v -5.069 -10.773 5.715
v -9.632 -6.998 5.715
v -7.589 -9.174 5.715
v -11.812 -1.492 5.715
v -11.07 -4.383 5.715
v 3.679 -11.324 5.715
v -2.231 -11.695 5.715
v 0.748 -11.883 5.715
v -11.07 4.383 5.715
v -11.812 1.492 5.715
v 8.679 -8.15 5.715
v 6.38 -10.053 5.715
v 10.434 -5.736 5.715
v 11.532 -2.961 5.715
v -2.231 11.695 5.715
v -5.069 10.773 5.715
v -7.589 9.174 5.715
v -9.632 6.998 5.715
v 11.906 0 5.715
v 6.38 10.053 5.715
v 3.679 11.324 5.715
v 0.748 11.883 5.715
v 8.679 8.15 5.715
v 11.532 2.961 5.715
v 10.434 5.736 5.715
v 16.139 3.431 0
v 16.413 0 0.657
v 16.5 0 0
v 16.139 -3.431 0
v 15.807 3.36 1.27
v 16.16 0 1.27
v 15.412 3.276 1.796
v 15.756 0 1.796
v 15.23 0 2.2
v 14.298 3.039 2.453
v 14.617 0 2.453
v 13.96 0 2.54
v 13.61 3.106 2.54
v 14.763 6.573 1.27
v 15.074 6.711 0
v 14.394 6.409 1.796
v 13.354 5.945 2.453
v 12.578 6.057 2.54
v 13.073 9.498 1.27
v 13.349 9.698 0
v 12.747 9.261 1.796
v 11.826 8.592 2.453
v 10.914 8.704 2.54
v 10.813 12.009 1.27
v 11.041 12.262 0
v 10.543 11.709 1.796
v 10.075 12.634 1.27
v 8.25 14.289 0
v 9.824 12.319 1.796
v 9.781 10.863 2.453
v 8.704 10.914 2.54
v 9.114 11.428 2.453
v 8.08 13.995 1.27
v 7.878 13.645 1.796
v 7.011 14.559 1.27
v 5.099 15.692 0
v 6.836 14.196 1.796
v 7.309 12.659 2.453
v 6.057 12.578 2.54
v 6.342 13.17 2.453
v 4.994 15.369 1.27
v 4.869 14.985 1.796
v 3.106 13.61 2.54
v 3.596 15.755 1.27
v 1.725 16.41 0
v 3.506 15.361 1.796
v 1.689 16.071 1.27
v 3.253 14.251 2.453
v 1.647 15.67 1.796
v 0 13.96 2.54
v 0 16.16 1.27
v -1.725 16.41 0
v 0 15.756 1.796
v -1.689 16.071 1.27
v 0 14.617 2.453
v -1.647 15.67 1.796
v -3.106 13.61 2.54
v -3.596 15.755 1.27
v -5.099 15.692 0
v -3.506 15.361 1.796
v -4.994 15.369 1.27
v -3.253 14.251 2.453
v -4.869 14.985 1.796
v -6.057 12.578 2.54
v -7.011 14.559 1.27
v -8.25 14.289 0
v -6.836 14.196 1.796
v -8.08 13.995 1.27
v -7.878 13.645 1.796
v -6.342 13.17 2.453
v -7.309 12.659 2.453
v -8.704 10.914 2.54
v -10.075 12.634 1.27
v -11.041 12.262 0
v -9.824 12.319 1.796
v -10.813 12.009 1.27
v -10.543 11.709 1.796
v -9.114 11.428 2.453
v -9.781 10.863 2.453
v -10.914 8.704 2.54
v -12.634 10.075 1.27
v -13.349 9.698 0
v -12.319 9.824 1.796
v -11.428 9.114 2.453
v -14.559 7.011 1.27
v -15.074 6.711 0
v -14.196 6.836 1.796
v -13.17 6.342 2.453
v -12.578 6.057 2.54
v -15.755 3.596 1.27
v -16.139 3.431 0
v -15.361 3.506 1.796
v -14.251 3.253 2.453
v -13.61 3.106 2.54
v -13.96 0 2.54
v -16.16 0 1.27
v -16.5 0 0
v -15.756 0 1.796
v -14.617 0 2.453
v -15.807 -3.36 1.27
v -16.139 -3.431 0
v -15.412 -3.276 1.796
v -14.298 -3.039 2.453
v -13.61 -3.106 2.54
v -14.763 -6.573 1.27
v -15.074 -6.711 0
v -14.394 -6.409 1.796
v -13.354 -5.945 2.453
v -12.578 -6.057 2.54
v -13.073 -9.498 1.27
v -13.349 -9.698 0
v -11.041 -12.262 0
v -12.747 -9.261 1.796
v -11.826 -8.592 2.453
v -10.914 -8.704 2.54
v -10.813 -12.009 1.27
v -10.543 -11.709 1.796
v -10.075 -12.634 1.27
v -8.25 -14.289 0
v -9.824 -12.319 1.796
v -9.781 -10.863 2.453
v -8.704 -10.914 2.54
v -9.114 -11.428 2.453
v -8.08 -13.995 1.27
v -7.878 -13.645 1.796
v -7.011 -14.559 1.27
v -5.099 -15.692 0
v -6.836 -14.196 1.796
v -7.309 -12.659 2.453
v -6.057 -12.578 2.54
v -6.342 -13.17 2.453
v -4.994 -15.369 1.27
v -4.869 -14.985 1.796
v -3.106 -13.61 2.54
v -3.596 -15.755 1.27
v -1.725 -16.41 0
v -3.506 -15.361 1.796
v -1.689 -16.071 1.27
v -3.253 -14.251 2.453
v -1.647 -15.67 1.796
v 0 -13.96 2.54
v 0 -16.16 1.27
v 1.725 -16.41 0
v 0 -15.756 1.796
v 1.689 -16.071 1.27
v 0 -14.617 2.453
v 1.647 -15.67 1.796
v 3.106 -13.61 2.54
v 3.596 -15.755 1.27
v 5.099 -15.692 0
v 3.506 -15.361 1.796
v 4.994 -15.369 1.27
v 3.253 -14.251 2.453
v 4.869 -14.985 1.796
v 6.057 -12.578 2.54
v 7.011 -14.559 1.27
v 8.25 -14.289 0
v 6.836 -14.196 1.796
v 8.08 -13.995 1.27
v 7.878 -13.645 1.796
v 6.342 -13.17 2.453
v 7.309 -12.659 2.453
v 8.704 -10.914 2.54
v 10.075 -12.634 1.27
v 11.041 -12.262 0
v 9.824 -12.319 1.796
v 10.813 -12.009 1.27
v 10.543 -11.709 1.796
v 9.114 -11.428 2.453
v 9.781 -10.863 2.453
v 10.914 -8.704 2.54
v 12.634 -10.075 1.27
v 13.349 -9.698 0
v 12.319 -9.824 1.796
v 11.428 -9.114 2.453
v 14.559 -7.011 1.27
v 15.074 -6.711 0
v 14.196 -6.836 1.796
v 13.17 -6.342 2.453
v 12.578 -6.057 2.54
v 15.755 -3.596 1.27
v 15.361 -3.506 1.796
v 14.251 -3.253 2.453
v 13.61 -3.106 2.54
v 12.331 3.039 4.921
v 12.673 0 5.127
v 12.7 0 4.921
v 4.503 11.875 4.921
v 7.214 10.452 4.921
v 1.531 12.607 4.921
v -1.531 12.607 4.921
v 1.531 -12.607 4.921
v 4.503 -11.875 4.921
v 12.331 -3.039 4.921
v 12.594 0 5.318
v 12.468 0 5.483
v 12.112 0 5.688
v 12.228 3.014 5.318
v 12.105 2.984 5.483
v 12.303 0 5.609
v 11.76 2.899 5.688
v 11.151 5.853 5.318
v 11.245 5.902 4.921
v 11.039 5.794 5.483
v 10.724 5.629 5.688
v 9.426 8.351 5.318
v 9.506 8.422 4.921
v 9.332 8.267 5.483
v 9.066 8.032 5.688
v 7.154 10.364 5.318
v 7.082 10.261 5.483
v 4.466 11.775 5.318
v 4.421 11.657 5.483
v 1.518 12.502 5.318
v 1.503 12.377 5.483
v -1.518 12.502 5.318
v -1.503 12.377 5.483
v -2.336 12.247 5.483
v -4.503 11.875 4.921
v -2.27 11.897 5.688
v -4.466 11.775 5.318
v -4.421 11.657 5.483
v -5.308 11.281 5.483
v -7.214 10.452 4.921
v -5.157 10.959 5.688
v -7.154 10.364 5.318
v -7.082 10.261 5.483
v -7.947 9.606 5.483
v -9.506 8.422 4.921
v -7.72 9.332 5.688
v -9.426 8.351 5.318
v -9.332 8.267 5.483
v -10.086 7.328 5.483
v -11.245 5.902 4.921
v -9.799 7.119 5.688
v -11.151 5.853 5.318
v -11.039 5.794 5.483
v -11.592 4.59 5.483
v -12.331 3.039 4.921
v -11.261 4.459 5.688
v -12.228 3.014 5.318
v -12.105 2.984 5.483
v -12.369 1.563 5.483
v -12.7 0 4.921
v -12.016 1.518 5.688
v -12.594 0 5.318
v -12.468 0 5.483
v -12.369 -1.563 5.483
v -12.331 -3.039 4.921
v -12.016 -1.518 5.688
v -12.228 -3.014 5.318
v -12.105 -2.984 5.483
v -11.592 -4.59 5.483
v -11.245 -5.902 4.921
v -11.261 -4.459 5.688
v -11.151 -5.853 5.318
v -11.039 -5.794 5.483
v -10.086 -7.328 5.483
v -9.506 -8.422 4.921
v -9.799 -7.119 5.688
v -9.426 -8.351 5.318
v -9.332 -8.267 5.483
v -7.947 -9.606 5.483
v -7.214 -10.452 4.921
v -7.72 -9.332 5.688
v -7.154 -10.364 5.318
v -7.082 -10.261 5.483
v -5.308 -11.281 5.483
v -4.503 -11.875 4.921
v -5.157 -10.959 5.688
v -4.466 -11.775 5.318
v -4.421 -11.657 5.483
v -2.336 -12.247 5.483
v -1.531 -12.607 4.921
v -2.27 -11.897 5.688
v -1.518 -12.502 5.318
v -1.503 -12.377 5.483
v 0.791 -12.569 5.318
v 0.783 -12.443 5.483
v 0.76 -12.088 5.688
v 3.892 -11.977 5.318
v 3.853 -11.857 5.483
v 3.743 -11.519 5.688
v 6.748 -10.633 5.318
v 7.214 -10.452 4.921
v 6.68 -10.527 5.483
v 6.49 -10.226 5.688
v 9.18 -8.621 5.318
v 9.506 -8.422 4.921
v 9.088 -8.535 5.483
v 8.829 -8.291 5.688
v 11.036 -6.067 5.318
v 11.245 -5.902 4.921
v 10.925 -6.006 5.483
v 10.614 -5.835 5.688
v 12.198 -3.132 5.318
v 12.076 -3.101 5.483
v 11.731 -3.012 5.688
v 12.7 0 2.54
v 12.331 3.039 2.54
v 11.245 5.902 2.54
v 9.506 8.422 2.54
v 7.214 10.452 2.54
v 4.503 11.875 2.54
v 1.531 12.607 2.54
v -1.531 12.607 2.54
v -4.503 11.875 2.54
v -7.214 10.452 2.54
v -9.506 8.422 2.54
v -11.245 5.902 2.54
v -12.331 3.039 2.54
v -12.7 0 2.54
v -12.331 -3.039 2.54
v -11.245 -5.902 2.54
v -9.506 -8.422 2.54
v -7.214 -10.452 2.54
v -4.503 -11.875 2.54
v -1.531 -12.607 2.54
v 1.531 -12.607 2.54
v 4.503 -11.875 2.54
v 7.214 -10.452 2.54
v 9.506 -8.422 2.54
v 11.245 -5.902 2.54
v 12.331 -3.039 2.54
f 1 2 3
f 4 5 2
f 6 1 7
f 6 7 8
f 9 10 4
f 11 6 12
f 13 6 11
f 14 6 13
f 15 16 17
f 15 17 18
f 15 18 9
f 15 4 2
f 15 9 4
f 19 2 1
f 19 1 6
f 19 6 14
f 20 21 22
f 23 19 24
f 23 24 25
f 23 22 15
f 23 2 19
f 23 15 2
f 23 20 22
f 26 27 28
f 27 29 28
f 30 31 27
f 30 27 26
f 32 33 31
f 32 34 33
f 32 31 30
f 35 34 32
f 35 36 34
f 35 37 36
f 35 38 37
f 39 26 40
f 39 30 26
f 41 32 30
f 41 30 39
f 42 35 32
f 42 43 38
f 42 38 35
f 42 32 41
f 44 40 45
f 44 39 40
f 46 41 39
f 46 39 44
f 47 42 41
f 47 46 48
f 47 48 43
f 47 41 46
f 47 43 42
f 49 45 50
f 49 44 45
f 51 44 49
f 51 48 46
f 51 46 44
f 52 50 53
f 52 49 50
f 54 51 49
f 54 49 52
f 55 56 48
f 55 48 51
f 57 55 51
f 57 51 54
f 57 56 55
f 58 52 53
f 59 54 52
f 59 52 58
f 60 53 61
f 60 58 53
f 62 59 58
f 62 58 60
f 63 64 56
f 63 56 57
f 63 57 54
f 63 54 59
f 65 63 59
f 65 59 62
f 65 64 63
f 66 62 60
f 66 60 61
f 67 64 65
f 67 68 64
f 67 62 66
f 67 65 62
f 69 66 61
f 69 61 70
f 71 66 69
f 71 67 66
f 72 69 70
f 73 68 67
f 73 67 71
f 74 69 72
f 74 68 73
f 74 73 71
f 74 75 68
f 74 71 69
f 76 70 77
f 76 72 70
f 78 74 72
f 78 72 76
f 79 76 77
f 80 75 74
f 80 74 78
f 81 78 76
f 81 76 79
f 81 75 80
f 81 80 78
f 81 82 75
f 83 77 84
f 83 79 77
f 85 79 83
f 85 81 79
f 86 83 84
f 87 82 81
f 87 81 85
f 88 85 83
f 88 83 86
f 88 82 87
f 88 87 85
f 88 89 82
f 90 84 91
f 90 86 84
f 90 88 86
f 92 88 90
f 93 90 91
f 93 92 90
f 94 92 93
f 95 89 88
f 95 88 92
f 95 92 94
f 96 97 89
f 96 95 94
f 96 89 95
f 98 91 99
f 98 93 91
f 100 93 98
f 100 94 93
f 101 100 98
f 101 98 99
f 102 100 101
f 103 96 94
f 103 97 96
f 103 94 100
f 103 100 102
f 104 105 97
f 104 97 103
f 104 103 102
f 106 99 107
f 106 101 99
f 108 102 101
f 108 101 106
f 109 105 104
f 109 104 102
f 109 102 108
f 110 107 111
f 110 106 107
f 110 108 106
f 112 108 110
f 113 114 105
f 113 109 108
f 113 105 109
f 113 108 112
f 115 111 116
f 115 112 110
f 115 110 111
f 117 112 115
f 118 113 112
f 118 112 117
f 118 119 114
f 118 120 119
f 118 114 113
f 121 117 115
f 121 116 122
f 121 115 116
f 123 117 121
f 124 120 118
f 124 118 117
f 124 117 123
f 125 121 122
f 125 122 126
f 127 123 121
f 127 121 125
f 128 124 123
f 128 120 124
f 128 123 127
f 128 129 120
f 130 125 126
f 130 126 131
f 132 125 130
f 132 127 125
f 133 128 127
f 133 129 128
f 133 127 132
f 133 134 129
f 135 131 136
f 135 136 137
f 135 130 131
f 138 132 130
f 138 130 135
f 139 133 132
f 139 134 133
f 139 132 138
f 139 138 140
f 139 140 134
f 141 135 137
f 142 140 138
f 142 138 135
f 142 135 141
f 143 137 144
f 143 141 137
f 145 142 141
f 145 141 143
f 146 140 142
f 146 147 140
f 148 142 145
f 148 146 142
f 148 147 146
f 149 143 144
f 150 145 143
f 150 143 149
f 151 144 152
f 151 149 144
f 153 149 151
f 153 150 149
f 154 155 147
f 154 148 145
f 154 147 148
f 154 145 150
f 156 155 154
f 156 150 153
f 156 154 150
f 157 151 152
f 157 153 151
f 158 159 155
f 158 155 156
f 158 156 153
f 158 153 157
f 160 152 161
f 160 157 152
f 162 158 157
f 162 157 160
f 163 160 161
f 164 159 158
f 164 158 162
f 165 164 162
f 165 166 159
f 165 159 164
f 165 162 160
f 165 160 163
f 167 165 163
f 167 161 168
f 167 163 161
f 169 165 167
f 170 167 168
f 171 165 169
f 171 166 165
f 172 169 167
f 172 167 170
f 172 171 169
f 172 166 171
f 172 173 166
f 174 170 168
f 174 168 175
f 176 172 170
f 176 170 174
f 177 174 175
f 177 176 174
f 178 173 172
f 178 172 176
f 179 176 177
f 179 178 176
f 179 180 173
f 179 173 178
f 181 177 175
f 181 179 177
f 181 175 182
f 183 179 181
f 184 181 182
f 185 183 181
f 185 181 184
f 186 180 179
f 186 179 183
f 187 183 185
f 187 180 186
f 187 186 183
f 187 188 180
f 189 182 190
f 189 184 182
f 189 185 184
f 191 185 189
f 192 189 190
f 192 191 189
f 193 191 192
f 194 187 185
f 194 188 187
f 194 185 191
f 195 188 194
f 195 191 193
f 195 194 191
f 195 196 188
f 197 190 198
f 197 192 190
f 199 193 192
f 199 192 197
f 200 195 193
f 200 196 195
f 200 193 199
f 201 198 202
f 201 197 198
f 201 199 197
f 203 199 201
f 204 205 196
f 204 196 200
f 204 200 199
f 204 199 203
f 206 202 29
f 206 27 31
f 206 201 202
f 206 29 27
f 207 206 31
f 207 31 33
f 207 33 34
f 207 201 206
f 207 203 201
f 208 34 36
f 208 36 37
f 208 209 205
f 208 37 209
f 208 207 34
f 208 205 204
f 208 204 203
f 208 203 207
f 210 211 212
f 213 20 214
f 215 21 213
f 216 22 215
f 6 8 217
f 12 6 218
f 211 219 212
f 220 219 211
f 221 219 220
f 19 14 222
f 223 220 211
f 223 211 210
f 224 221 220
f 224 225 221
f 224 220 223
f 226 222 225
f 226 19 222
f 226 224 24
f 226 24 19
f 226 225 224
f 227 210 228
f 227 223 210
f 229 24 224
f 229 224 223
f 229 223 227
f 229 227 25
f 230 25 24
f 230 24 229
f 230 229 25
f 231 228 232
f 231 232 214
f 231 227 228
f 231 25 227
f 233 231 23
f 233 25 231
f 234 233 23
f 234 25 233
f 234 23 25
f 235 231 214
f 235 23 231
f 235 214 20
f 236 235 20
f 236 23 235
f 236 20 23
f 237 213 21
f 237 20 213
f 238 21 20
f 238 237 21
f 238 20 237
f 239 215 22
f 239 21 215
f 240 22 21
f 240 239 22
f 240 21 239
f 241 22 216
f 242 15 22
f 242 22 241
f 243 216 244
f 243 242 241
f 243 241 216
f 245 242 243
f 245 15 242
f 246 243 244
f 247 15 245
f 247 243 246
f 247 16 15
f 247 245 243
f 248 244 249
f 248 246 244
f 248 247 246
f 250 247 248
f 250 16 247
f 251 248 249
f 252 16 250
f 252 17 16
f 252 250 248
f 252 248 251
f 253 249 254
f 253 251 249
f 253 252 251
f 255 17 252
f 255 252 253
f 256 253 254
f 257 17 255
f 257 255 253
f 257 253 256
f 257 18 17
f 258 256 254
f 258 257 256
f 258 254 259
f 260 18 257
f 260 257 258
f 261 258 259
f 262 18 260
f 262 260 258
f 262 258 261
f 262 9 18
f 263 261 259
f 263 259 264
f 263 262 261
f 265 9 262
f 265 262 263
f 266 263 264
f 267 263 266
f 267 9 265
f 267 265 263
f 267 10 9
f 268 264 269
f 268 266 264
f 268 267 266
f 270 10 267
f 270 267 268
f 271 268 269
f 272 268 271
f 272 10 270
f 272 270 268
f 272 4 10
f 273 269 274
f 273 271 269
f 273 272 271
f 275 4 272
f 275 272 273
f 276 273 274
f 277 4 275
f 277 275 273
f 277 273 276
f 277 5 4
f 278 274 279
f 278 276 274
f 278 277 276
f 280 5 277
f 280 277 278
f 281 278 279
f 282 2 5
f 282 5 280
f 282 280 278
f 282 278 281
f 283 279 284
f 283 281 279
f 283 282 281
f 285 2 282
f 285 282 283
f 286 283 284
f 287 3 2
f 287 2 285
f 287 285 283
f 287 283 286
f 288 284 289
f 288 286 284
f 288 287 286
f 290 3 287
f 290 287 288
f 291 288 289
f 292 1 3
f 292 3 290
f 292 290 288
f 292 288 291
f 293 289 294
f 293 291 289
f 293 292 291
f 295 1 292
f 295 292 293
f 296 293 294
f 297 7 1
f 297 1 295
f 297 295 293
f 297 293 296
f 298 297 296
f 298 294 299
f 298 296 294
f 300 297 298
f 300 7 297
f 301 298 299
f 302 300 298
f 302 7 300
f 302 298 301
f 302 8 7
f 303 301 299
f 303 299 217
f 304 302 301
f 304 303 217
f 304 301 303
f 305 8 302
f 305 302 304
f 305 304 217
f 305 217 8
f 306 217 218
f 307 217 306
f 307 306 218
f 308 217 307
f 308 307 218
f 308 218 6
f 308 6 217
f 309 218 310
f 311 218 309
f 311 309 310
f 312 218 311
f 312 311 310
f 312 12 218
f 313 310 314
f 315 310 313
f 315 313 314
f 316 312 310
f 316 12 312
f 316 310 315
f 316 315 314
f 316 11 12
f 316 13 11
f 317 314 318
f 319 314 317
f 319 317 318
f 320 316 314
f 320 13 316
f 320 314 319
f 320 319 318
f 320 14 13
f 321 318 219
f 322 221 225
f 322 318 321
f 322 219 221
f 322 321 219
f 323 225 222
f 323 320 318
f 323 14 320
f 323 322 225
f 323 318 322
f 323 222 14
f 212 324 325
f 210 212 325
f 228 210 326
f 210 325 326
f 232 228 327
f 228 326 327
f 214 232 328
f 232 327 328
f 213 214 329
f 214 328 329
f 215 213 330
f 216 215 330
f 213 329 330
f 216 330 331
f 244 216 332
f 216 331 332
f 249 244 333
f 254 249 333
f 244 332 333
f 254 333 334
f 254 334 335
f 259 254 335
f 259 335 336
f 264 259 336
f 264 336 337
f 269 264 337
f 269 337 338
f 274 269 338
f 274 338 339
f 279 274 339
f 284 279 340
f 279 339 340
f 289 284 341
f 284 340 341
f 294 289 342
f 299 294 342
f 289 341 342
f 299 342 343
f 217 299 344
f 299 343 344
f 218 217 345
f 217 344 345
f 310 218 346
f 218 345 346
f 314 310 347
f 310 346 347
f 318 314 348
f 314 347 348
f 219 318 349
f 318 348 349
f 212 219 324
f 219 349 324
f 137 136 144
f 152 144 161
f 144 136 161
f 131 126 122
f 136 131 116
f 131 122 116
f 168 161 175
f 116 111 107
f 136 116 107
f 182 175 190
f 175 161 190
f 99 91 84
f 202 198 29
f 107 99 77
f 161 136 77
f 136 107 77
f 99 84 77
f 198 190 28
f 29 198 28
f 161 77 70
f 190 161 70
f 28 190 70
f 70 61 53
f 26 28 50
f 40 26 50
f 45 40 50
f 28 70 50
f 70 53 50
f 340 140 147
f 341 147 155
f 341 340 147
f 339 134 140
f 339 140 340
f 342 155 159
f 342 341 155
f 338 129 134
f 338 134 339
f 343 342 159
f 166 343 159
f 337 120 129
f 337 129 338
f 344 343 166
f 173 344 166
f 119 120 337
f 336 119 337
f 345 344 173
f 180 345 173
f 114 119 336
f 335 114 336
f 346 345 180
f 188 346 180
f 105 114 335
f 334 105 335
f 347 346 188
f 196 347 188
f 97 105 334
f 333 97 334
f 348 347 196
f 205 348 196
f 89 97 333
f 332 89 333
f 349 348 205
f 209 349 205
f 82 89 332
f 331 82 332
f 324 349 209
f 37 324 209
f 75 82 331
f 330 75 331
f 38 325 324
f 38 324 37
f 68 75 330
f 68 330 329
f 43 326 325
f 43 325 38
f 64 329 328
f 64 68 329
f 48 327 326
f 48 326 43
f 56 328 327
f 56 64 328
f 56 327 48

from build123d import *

# Parameters (mm, degrees)
F0_R     = 16.5
F1_DEPTH = 2.54
F2_R     = 12.7
F3_DEPTH = 3.175
F4_R     = 2.53999
F5_R     = 0.79375


# Not quite as in the source:
# - a fillet or chamfer is up to 0.001 mm smaller than in the source, because OpenCascade refuses the exact size


with BuildPart() as f1:
    # F0 (on Top) → F1 (new body)
    with BuildSketch(Plane.XY):
        Circle(F0_R)
    extrude(amount=F1_DEPTH)

    # F2 (on face) → F3 (join)
    with BuildSketch(Plane.XY.offset(2.54)):
        Circle(F2_R)
    extrude(amount=F3_DEPTH)

    # F4 (radius 2.54 in the source; OpenCascade refuses exactly that, so slightly less here)
    f4_edges = [f1.edges().sort_by_distance(p)[0] for p in [
        (-16.5, 0, 2.54),
    ]]
    fillet(f4_edges, radius=F4_R)

    # F5
    f5_edges = [f1.edges().sort_by_distance(p)[0] for p in [
        (-12.7, 0, 5.715),
    ]]
    fillet(f5_edges, radius=F5_R)


solid = f1.part
